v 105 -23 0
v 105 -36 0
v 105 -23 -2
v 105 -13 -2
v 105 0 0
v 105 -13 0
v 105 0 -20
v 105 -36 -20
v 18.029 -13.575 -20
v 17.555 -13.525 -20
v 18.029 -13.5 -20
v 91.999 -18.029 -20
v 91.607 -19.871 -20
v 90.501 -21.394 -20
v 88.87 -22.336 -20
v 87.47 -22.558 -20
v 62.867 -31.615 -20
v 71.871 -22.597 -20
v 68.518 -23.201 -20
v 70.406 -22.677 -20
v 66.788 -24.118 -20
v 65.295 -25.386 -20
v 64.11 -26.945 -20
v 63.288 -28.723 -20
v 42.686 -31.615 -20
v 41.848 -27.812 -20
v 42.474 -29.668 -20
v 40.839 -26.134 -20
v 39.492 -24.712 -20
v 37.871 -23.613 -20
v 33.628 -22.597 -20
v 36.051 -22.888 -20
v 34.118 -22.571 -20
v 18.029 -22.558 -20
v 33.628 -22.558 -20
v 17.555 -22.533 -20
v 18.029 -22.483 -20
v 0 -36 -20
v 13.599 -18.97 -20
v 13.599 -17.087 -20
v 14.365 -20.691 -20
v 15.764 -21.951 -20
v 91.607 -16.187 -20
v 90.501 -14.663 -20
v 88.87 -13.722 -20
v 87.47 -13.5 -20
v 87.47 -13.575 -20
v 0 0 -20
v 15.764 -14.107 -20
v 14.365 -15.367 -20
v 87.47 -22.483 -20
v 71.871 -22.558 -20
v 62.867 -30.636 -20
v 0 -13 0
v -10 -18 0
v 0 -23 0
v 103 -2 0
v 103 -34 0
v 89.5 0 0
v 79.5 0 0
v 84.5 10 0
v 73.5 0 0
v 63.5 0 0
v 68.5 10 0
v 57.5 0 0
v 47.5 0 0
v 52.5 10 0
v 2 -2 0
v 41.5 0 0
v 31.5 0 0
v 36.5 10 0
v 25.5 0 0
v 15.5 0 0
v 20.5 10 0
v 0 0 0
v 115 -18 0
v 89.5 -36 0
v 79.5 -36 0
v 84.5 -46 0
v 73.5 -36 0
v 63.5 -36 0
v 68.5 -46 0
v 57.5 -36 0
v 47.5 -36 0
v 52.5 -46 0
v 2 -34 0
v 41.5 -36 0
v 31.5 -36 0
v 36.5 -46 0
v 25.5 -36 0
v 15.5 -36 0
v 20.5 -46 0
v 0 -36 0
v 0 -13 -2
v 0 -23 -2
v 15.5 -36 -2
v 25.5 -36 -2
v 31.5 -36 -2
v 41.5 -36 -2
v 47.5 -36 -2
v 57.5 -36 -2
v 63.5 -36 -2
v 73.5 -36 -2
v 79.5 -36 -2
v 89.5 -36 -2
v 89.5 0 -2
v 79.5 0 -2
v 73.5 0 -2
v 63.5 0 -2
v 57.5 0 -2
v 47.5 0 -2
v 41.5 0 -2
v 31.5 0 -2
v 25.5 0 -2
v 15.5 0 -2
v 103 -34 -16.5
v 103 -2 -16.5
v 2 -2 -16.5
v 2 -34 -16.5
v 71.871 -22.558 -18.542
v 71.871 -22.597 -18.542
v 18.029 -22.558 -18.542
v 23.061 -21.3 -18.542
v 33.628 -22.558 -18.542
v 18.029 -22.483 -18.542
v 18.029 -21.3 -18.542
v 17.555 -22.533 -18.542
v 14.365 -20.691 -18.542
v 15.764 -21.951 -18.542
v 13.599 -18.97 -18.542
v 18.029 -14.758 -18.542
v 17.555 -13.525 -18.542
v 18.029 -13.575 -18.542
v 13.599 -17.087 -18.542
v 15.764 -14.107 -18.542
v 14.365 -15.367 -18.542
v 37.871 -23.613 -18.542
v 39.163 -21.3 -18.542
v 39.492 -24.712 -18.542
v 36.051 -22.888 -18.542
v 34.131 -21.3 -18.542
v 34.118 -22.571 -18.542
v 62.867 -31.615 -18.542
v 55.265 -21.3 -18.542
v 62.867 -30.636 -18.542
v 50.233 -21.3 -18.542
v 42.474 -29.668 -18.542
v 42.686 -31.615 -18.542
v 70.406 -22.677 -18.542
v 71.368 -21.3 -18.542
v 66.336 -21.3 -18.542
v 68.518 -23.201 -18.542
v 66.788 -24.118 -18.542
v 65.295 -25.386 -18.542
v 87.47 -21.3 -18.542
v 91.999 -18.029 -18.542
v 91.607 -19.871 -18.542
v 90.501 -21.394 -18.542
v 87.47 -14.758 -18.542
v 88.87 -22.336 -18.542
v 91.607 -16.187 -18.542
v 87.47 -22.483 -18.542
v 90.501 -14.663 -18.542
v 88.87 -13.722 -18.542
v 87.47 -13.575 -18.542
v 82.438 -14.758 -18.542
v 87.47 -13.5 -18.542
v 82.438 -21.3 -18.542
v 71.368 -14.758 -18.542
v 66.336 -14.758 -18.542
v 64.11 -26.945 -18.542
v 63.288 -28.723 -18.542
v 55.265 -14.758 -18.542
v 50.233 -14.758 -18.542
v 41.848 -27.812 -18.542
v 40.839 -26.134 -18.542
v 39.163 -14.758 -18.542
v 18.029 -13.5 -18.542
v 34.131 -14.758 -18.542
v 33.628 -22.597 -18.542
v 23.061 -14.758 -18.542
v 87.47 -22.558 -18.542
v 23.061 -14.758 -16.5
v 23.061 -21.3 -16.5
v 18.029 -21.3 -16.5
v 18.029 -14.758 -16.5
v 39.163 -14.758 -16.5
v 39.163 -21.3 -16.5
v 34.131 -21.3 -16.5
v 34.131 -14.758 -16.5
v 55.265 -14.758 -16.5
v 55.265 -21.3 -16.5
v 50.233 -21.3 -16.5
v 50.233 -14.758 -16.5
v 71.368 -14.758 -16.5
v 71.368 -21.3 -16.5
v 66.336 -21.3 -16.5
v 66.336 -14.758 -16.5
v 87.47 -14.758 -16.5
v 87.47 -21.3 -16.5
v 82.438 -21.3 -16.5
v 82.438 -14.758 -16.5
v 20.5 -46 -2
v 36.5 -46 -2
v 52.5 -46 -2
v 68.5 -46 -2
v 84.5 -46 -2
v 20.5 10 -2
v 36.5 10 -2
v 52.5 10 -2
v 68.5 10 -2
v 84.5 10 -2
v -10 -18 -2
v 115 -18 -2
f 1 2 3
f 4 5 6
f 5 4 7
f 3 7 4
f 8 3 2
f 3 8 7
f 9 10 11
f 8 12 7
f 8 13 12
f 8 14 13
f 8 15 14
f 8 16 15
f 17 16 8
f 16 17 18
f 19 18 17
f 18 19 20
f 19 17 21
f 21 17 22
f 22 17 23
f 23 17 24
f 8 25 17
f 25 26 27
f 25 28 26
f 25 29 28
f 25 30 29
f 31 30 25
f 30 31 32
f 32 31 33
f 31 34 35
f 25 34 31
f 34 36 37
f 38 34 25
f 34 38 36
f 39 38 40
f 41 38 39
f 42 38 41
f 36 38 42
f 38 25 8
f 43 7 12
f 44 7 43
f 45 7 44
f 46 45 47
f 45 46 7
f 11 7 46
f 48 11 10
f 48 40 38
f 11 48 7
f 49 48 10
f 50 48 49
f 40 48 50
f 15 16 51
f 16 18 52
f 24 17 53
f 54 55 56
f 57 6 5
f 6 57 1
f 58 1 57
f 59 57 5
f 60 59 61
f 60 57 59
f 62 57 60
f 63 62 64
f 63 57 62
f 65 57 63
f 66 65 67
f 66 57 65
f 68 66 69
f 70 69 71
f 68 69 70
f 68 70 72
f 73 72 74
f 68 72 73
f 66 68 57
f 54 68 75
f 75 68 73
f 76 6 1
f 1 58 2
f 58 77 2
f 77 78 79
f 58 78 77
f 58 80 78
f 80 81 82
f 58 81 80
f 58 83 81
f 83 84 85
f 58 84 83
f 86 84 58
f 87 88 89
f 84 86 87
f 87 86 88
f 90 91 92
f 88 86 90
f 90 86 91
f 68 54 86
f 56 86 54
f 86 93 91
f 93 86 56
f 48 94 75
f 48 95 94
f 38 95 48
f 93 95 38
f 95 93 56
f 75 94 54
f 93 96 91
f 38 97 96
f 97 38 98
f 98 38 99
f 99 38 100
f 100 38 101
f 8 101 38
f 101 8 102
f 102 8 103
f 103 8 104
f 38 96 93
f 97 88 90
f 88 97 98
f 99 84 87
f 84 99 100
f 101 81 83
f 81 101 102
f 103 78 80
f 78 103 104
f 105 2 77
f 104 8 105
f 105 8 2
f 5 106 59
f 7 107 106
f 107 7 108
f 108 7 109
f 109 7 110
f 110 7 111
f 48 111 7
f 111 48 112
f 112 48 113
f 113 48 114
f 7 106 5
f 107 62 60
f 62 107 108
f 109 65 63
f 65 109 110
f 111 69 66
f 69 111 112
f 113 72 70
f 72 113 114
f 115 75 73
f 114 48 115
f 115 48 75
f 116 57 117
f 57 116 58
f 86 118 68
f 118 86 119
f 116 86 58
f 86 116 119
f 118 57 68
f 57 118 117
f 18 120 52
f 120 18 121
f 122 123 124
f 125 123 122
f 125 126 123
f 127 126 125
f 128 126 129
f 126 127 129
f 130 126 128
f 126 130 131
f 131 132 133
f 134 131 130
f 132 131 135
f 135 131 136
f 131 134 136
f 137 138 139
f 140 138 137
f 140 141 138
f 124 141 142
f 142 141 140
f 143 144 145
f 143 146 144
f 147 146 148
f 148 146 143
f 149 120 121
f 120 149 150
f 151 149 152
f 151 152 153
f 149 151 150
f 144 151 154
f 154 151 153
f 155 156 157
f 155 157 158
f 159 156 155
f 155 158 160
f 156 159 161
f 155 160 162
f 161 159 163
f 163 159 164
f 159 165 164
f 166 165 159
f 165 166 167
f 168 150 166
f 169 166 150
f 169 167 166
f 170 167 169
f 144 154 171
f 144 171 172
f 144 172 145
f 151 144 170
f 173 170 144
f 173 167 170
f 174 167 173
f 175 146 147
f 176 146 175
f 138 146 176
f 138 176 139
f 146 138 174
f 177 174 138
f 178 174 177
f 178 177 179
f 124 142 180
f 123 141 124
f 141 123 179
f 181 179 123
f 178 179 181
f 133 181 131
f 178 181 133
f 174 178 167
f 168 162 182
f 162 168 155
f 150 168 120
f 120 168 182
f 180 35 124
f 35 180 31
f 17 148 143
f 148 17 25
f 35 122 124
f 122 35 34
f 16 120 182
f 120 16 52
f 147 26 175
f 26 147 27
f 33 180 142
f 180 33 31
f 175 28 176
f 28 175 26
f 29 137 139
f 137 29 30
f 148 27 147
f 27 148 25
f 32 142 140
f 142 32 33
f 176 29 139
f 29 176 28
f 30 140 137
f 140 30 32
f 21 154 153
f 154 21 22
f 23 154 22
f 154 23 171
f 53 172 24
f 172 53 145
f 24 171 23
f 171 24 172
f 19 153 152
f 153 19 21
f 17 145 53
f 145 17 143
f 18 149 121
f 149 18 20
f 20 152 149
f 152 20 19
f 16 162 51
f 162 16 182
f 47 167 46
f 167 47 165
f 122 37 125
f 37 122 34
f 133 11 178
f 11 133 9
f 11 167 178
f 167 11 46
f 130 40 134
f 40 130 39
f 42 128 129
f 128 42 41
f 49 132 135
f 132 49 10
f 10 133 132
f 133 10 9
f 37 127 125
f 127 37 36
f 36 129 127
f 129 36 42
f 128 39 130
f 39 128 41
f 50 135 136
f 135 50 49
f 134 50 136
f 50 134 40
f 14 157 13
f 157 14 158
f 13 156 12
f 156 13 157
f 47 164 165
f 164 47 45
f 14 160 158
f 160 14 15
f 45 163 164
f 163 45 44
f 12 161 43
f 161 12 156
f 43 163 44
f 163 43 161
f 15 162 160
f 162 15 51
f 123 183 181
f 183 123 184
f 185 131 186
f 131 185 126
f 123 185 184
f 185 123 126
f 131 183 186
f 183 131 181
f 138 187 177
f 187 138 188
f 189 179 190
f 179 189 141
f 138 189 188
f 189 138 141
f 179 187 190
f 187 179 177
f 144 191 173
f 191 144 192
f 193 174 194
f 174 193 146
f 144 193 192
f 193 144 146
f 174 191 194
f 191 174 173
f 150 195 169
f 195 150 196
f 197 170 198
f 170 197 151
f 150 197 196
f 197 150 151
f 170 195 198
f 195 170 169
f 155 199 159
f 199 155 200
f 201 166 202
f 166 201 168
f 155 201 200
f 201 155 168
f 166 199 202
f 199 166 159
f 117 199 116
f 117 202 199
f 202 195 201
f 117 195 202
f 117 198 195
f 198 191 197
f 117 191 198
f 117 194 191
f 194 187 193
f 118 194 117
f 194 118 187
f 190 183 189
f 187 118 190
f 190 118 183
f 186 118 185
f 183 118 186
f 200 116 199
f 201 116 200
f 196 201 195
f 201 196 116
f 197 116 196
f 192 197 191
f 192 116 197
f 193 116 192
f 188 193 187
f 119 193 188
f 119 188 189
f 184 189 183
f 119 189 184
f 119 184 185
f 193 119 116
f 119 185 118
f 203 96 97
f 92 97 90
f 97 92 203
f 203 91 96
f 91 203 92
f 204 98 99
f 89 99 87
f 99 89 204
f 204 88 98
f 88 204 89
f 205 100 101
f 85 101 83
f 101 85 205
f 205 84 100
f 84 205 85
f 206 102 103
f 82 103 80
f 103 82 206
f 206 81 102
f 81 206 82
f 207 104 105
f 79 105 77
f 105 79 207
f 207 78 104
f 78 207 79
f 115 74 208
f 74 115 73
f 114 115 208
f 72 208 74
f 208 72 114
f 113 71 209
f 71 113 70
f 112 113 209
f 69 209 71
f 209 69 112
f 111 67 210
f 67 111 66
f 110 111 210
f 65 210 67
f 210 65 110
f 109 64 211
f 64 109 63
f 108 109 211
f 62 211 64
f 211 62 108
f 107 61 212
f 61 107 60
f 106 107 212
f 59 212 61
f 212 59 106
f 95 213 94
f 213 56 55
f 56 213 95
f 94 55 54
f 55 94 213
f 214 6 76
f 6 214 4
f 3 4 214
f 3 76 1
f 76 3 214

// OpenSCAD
tracker_depth=9;
tracker_width=78;
tracker_height=1.5;
tracker_core_width=78-tracker_depth;
tracker_connector_depth=18-tracker_depth;
tracker_connector_width=29;
tracker_connector_hole=1.4;
tracker_hole_x=tracker_connector_depth+1.75;
tracker_hole_y=tracker_connector_depth-5.8;
sensor_width=5;
sensor_depth=6.5;
sensor_height=6.5;
sensor_distance=16;
security=0.20;

module tracker_board() {    
    translate([(tracker_core_width-(tracker_connector_width+tracker_connector_depth))/2,tracker_depth,0]){
        difference() {
            cube([tracker_connector_width+tracker_connector_depth,tracker_connector_depth,tracker_height]);
            translate([0,tracker_depth,0]){
                cylinder(tracker_height,tracker_depth, tracker_depth);
            }
            translate([tracker_connector_width+tracker_connector_depth,tracker_depth,0]){
                cylinder(tracker_height,tracker_depth, tracker_depth);
            }
            /*translate([tracker_hole_x,tracker_hole_y,0]){
                cylinder(tracker_height,tracker_connector_hole, tracker_connector_hole, $fn=16);
            }
            translate([tracker_connector_width+tracker_connector_depth-tracker_hole_x,tracker_hole_y,0]){
                cylinder(tracker_height,tracker_connector_hole, tracker_connector_hole, $fn=16);
            }*/
        }
    }
    cube([tracker_core_width,tracker_depth,tracker_height]);
    translate([0,tracker_depth/2,0]){
        cylinder(tracker_height,tracker_depth/2, tracker_depth/2);
    }
    translate([tracker_core_width,tracker_depth/2,0]){
        cylinder(tracker_height,tracker_depth/2, tracker_depth/2);
    }
}

module sensor() {
    cube([sensor_width,sensor_depth,sensor_height]);
}

module tracker() {
    translate([tracker_depth/2,0,sensor_height]) tracker_board();
    for(i=[0:4]) translate([(tracker_depth/2)+sensor_distance*i,(tracker_depth-sensor_depth)/2,]) sensor();
}


module mark() {
    linear_extrude(height = 2) {
        polygon([[0,0],[10,0],[5,10]]);
    }
}

module tracker_mask() {
    border=2;
    height=12;
    difference() {
        cube([(tracker_width-tracker_depth+2*sensor_distance)+2*border,sensor_distance*2+2*border,sensor_height+tracker_height+height]);
        translate([border,border,0]){
            cube([(tracker_width-tracker_depth+2*sensor_distance),sensor_distance*2,sensor_height+border+height]);
        }
    }
    translate([border,border,height]){
        difference() {
            translate([0,0,sensor_height-border]){
                cube([tracker_width-tracker_depth+2*sensor_distance,sensor_distance*2,tracker_height+border]);
            }
            translate([sensor_distance-(tracker_depth/2),(2*sensor_distance-tracker_depth)/2,0]){
                resize([tracker_width+2*security,0,0], auto=true) tracker();
            }
        }
    }
    for(i=[0:4]) {
        translate([border+sensor_distance+(i*(sensor_distance))-(10-sensor_width)/2,sensor_distance*2+2*border,0]){
            echo(border+sensor_distance+(i*(sensor_distance))-(10-sensor_width)/2);
            mark();
        }
    }
    for(i=[0:4]) {
        translate([border+sensor_distance+(i*(sensor_distance))+10-(10-sensor_width)/2,0,0]){
            rotate([0,0,180]) mark();
        }
    }
    translate([0,border+sensor_distance-5,0]){
        rotate([0,0,90]) mark();
    }
     translate([tracker_width-tracker_depth+2*sensor_distance+2*border,border+sensor_distance+5,0]){
        rotate([0,0,-90]) mark();
    }
   
}

rotate([180,0,0]) tracker_mask();
